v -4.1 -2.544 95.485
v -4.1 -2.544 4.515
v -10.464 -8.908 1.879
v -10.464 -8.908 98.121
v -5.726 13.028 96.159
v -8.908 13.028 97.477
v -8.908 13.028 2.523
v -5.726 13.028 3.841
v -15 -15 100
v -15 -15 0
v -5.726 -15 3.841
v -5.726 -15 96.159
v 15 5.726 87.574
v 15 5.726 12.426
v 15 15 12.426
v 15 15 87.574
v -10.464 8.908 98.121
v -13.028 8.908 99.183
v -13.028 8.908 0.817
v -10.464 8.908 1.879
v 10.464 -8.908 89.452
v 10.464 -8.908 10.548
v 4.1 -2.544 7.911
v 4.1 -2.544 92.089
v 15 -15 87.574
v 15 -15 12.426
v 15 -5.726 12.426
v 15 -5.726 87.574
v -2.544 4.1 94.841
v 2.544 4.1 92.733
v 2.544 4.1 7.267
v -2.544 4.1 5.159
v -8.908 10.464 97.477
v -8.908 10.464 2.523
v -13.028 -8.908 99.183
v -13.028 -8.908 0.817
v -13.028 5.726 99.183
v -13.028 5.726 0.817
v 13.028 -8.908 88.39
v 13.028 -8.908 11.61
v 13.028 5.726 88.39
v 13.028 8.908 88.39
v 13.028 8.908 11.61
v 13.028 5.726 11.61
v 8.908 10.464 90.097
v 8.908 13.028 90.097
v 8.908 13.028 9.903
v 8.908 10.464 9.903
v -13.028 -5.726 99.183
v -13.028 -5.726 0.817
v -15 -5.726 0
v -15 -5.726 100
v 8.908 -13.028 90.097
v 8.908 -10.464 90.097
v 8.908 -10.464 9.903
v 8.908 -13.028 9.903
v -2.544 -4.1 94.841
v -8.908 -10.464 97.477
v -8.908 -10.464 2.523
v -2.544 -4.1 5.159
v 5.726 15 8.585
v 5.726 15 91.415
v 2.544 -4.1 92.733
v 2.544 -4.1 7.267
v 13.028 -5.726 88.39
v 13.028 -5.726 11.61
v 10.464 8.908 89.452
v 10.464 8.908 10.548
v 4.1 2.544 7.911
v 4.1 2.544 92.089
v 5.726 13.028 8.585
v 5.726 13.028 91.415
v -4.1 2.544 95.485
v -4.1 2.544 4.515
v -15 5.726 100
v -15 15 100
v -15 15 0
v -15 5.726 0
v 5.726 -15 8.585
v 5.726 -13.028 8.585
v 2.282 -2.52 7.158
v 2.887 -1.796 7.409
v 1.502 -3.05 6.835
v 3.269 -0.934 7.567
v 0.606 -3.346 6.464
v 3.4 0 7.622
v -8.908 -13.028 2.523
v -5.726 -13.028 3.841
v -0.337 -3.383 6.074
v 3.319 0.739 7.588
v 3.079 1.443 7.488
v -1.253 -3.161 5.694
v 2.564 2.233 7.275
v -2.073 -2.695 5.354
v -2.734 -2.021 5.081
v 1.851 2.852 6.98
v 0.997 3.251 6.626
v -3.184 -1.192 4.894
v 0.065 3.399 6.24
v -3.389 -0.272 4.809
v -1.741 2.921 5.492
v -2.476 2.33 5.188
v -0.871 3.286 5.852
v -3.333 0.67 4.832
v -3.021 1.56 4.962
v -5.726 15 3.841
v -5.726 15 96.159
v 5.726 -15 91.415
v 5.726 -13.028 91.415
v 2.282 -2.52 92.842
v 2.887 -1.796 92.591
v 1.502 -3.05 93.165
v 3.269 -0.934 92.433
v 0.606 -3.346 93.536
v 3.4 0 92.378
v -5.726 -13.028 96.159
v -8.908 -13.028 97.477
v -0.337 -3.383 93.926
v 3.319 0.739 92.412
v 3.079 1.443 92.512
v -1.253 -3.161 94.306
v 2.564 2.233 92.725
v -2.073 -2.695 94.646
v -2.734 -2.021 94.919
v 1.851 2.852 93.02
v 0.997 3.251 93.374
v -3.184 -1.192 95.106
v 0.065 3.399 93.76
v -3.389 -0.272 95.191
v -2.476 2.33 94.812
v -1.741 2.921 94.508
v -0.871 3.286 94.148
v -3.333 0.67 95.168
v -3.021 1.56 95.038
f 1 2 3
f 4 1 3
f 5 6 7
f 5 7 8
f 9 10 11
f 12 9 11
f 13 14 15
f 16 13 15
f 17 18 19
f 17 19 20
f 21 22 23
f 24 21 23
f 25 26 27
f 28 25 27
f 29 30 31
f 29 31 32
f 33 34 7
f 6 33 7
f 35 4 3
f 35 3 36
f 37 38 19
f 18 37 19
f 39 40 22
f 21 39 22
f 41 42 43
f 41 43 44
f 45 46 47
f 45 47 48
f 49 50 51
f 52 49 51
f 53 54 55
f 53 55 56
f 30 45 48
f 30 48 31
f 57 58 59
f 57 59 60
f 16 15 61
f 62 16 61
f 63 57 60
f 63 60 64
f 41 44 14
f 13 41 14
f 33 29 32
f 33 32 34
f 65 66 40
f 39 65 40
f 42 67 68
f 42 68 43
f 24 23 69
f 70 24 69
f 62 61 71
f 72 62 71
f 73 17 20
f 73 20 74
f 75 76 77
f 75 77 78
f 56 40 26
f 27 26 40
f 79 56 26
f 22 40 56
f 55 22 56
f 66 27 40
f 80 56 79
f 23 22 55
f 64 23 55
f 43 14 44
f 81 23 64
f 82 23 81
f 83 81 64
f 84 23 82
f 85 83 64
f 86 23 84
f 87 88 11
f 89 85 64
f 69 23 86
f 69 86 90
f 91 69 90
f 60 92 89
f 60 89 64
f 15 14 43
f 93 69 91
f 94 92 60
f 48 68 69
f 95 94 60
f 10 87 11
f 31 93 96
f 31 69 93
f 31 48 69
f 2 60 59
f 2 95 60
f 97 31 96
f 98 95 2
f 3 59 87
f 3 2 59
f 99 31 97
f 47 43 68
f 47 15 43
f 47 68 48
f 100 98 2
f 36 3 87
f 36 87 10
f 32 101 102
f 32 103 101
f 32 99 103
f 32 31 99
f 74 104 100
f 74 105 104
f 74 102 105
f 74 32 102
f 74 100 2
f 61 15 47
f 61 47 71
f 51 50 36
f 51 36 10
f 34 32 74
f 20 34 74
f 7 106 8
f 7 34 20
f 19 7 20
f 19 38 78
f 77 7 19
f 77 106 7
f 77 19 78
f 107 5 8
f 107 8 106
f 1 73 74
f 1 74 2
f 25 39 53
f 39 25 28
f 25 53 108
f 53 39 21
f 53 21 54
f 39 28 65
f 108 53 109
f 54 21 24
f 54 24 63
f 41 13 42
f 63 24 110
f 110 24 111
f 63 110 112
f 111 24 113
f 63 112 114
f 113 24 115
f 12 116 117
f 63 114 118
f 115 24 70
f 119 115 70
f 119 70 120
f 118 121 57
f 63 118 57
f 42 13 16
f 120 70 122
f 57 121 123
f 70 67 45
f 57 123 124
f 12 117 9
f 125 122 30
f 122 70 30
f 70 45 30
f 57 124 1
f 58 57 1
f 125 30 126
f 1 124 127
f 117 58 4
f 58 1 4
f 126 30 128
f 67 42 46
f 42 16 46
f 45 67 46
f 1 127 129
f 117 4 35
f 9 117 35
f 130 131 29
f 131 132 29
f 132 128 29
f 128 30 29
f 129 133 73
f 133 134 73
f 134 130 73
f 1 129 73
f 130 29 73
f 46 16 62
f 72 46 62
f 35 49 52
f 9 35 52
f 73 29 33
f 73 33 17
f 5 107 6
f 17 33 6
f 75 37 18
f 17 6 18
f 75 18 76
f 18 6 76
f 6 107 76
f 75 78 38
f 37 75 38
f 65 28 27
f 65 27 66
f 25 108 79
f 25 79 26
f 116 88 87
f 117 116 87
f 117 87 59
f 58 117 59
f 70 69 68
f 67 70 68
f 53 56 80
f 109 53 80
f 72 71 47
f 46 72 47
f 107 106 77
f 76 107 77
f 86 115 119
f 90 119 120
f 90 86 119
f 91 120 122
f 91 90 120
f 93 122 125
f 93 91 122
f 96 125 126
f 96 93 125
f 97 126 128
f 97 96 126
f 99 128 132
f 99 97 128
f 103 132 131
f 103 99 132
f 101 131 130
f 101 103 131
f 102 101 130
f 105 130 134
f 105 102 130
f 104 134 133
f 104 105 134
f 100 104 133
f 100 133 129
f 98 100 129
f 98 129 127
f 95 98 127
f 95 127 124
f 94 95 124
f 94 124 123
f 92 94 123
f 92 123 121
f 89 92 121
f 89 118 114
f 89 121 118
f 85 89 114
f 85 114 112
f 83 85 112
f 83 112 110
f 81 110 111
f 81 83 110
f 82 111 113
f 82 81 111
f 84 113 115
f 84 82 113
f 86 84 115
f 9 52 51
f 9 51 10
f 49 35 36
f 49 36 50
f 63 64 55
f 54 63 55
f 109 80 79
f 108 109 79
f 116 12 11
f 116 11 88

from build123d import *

# Parameters (mm, degrees)
SKETCH3_R           = 3.4
BOSS_EXTRUDE1_DEPTH = 100
CUT_EXTRUDE1_DEPTH  = 38
CUT_EXTRUDE2_DEPTH  = 38


with BuildPart() as part:
    # Sketch3 → Boss-Extrude1 (new body)
    with BuildSketch(Plane.XY):
        Polygon((-4.1, 2.544365081), (-4.1, -2.544365081), (-10.463961031, -8.908326112), (-13.02814489, -8.908326112), (-13.02814489, -5.726345597), (-15, -5.726345597), (-15, -15), (-5.726345597, -15), (-5.726345597, -13.02814489), (-8.908326112, -13.02814489), (-8.908326112, -10.463961031), (-2.544365081, -4.1), (2.544365081, -4.1), (8.908326112, -10.463961031), (8.908326112, -13.02814489), (5.726345597, -13.02814489), (5.726345597, -15), (15, -15), (15, -5.726345597), (13.02814489, -5.726345597), (13.02814489, -8.908326112), (10.463961031, -8.908326112), (4.1, -2.544365081), (4.1, 2.544365081), (10.463961031, 8.908326112), (13.02814489, 8.908326112), (13.02814489, 5.726345597), (15, 5.726345597), (15, 15), (5.726345597, 15), (5.726345597, 13.02814489), (8.908326112, 13.02814489), (8.908326112, 10.463961031), (2.544365081, 4.1), (-2.544365081, 4.1), (-8.908326112, 10.463961031), (-8.908326112, 13.02814489), (-5.726345597, 13.02814489), (-5.726345597, 15), (-15, 15), (-15, 5.726345597), (-13.02814489, 5.726345597), (-13.02814489, 8.908326112), (-10.463961031, 8.908326112), align=None)
        Circle(SKETCH3_R, mode=Mode.SUBTRACT)
    extrude(amount=BOSS_EXTRUDE1_DEPTH)

    # Sketch4 → Cut-Extrude1 (cut)
    with BuildSketch(Plane(origin=(0, 15, 0), x_dir=(1, 0, 0), z_dir=(0, 1, 0))):
        Polygon((-15, -100), (15, -100), (15, -87.573593129), align=None)
    extrude(amount=-CUT_EXTRUDE1_DEPTH, mode=Mode.SUBTRACT)

    # Sketch5 → Cut-Extrude2 (cut)
    with BuildSketch(Plane(origin=(0, 15, 0), x_dir=(1, 0, 0), z_dir=(0, 1, 0))):
        Polygon((-15, 0), (15, 0), (15, -12.426406871), align=None)
    extrude(amount=-CUT_EXTRUDE2_DEPTH, mode=Mode.SUBTRACT)


solid = part.part
